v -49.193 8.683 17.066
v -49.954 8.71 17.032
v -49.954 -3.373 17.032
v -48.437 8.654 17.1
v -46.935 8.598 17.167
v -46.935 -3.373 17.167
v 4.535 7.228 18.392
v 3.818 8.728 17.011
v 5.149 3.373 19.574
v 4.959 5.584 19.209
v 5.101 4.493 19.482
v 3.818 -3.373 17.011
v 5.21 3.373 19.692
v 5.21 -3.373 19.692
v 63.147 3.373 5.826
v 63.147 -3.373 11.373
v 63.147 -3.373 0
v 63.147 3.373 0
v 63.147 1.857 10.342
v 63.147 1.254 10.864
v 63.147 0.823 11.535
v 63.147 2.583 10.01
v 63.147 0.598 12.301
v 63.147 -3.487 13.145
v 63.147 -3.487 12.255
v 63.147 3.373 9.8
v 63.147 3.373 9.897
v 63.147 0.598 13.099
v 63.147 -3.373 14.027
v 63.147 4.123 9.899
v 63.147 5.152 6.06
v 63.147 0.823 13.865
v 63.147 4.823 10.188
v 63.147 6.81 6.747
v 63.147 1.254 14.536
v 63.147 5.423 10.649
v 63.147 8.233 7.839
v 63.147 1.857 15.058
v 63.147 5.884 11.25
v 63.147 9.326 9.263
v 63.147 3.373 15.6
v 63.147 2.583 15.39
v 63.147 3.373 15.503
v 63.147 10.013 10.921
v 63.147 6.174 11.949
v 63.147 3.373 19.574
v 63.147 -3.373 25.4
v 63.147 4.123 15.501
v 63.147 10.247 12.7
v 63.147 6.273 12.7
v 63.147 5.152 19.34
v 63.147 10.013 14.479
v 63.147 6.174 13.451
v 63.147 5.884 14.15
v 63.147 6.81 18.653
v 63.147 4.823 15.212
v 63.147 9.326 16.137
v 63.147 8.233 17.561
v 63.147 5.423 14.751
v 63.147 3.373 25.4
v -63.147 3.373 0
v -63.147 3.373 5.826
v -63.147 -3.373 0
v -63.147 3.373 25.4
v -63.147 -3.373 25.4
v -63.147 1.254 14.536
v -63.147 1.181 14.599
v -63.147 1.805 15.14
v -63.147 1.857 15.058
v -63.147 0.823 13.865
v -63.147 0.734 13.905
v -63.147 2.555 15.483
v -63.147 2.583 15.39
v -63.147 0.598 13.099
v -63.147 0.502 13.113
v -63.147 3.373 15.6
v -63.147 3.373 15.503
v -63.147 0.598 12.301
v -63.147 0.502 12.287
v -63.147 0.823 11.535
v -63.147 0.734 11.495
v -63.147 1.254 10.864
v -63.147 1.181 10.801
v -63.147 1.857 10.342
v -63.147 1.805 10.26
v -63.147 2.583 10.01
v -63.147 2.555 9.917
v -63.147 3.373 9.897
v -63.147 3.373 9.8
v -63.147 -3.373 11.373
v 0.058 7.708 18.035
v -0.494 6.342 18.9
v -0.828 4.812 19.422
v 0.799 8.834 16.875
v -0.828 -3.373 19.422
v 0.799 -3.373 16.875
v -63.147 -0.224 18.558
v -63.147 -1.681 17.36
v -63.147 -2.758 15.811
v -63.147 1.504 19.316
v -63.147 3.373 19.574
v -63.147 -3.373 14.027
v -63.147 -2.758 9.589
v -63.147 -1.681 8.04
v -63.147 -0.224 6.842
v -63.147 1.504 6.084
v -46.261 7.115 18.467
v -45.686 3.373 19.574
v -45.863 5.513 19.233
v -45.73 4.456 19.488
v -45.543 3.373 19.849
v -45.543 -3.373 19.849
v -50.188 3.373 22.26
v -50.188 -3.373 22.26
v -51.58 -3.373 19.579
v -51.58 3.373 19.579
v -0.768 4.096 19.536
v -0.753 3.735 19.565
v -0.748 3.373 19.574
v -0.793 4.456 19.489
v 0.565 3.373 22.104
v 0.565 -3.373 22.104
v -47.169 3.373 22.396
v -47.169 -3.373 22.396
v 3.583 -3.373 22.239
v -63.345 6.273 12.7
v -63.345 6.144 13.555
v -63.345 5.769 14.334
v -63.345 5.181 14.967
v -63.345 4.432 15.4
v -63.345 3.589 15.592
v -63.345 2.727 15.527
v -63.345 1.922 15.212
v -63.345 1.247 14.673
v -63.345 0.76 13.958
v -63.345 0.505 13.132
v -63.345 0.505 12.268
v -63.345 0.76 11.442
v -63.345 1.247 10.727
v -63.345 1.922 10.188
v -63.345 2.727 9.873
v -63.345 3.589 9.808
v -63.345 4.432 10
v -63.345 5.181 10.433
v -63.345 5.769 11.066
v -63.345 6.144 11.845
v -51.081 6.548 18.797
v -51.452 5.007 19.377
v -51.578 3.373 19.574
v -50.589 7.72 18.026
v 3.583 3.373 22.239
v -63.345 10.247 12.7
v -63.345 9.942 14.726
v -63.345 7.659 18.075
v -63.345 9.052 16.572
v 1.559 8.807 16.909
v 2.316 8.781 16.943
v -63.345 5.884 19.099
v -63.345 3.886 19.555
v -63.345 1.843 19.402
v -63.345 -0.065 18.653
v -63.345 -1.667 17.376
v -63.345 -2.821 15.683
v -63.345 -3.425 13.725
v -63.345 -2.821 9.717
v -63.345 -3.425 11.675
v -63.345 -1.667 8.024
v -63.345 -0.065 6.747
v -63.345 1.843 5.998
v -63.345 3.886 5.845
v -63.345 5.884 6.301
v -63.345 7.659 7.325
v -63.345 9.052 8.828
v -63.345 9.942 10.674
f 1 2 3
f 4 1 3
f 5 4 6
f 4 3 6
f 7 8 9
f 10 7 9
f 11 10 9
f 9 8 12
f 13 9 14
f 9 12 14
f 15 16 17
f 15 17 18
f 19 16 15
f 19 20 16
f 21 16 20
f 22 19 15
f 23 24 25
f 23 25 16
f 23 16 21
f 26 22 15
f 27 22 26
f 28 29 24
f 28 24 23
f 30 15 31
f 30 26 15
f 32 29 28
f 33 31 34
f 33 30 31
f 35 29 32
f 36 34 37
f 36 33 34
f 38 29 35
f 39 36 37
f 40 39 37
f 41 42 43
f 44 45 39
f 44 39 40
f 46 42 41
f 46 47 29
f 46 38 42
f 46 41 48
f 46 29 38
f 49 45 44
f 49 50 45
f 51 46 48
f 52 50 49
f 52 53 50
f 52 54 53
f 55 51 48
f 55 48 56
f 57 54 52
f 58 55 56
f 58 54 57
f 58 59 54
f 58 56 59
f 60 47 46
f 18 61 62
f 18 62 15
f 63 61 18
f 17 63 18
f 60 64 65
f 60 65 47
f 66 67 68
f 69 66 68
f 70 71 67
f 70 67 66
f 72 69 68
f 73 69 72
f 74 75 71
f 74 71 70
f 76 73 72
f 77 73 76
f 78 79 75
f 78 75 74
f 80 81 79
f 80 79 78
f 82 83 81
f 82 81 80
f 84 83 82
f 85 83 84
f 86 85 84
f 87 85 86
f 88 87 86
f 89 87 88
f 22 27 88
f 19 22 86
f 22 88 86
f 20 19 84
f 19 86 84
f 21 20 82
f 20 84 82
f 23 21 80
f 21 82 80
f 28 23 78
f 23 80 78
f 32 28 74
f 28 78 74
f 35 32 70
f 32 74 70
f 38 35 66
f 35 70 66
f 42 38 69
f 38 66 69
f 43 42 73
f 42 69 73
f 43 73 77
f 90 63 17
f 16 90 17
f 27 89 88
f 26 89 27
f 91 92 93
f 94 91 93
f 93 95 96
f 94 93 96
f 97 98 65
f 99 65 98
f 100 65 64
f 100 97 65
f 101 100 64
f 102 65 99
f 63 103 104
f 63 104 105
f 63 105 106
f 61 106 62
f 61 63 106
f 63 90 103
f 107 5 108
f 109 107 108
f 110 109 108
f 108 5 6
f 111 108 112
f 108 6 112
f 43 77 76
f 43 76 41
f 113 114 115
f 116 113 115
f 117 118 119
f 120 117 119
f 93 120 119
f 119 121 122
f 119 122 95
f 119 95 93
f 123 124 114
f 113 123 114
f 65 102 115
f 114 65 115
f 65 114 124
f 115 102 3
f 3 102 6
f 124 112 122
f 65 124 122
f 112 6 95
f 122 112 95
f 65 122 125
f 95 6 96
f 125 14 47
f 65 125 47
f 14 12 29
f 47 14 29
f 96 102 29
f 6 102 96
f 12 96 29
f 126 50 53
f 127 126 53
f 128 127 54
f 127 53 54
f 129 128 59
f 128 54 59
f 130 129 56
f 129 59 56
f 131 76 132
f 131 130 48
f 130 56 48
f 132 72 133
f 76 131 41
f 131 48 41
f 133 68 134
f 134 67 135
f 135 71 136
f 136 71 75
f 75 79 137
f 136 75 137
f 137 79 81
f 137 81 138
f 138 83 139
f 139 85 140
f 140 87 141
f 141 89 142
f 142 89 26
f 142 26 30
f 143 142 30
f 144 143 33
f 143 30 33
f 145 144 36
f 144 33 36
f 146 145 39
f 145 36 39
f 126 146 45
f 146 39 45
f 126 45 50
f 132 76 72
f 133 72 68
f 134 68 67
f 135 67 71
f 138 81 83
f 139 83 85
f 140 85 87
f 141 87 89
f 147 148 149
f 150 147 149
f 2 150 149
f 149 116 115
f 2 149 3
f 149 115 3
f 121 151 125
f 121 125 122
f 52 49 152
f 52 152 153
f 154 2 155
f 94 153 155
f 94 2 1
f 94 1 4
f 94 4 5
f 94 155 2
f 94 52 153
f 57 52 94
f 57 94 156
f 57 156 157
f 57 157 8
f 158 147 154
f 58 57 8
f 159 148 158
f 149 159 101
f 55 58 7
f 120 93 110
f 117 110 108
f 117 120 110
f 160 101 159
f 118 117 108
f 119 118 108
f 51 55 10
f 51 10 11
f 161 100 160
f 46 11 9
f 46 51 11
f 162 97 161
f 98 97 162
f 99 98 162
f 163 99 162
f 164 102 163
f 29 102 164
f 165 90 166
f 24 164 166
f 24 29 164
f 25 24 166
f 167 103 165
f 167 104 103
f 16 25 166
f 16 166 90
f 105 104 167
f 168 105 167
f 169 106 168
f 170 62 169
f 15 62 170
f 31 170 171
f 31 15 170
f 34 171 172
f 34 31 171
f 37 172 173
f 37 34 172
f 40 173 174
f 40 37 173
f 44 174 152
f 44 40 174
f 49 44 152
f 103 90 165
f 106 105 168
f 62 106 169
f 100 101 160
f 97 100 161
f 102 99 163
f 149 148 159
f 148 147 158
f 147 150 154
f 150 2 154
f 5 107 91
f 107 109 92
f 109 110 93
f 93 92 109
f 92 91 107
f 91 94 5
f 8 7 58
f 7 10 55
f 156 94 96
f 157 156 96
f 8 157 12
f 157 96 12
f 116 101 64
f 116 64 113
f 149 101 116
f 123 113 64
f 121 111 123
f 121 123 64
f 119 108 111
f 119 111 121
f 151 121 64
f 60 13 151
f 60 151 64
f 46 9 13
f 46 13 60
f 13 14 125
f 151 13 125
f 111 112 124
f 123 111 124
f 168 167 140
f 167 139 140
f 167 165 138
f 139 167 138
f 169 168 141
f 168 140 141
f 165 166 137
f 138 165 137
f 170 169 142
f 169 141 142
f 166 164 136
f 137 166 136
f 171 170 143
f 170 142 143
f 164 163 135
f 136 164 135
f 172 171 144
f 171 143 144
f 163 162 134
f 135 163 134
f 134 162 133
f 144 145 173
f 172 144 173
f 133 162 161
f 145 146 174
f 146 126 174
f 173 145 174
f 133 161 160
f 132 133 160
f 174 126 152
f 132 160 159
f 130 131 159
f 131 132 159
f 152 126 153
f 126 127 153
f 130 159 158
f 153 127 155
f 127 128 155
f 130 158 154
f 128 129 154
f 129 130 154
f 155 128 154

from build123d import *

# Parameters (mm, degrees)
F0_W      = 126.2948513031
F0_H      = 6.7450292408
F1_DEPTH  = 25.4
F4_R      = 2.8033052418
F5_DEPTH  = 127
F6_R      = 6.8744186216
F6_R_2    = 2.9001482236
F7_DEPTH  = 126.492
F9_DEPTH  = 12.7
F11_DEPTH = 12.7


# Not quite as in the source:
# - the program builds the solid bodies; features that only make, move or delete a surface that nothing else refers to are left out


with BuildPart() as f1:
    # F0 (on Top) → F1 (new body)
    with BuildSketch(Plane.XY):
        Rectangle(F0_W, F0_H)
    extrude(amount=F1_DEPTH)

    # F4 (on face) → F5 (cut)
    with BuildSketch(Plane(origin=(-63.1474256516, 0, 0), x_dir=(0, -1, 0), z_dir=(-1, 0, 0))):
        with Locations((-3.3725146204, 12.7)):
            Circle(F4_R)
    extrude(amount=-F5_DEPTH, mode=Mode.SUBTRACT)

    # F6 (on face) → F7 (join)
    with BuildSketch(Plane.YZ.offset(63.1474256516)):
        with Locations((3.3725146204, 12.7)):
            Circle(F6_R)
        with Locations((3.3725146204, 12.7)):
            Circle(F6_R_2, mode=Mode.SUBTRACT)
    extrude(amount=-F7_DEPTH)

    # F8 (on face) → F9 (cut)
    with BuildSketch(Plane.XZ.offset(3.3725146204)):
        Polygon((-45.5430149111, 19.8489452356), (-47.1694619385, 22.3956269569), (-50.1881765182, 22.2604233738), (-51.5804440704, 19.5785380695), (-49.953997043, 17.0318563483), (-46.9352824633, 17.1670599313), align=None)
    extrude(amount=-F9_DEPTH, mode=Mode.SUBTRACT)

    # F10 (on face) → F11 (cut)
    with BuildSketch(Plane.XZ.offset(3.3725146204)):
        Polygon((5.2098441705, 19.6924402974), (3.583397143, 22.2391220187), (0.5646825633, 22.1039184357), (-0.8275849889, 19.4220331314), (0.7988620385, 16.8753514101), (3.8175766182, 17.0105549931), align=None)
    extrude(amount=-F11_DEPTH, mode=Mode.SUBTRACT)


solid = f1.part
